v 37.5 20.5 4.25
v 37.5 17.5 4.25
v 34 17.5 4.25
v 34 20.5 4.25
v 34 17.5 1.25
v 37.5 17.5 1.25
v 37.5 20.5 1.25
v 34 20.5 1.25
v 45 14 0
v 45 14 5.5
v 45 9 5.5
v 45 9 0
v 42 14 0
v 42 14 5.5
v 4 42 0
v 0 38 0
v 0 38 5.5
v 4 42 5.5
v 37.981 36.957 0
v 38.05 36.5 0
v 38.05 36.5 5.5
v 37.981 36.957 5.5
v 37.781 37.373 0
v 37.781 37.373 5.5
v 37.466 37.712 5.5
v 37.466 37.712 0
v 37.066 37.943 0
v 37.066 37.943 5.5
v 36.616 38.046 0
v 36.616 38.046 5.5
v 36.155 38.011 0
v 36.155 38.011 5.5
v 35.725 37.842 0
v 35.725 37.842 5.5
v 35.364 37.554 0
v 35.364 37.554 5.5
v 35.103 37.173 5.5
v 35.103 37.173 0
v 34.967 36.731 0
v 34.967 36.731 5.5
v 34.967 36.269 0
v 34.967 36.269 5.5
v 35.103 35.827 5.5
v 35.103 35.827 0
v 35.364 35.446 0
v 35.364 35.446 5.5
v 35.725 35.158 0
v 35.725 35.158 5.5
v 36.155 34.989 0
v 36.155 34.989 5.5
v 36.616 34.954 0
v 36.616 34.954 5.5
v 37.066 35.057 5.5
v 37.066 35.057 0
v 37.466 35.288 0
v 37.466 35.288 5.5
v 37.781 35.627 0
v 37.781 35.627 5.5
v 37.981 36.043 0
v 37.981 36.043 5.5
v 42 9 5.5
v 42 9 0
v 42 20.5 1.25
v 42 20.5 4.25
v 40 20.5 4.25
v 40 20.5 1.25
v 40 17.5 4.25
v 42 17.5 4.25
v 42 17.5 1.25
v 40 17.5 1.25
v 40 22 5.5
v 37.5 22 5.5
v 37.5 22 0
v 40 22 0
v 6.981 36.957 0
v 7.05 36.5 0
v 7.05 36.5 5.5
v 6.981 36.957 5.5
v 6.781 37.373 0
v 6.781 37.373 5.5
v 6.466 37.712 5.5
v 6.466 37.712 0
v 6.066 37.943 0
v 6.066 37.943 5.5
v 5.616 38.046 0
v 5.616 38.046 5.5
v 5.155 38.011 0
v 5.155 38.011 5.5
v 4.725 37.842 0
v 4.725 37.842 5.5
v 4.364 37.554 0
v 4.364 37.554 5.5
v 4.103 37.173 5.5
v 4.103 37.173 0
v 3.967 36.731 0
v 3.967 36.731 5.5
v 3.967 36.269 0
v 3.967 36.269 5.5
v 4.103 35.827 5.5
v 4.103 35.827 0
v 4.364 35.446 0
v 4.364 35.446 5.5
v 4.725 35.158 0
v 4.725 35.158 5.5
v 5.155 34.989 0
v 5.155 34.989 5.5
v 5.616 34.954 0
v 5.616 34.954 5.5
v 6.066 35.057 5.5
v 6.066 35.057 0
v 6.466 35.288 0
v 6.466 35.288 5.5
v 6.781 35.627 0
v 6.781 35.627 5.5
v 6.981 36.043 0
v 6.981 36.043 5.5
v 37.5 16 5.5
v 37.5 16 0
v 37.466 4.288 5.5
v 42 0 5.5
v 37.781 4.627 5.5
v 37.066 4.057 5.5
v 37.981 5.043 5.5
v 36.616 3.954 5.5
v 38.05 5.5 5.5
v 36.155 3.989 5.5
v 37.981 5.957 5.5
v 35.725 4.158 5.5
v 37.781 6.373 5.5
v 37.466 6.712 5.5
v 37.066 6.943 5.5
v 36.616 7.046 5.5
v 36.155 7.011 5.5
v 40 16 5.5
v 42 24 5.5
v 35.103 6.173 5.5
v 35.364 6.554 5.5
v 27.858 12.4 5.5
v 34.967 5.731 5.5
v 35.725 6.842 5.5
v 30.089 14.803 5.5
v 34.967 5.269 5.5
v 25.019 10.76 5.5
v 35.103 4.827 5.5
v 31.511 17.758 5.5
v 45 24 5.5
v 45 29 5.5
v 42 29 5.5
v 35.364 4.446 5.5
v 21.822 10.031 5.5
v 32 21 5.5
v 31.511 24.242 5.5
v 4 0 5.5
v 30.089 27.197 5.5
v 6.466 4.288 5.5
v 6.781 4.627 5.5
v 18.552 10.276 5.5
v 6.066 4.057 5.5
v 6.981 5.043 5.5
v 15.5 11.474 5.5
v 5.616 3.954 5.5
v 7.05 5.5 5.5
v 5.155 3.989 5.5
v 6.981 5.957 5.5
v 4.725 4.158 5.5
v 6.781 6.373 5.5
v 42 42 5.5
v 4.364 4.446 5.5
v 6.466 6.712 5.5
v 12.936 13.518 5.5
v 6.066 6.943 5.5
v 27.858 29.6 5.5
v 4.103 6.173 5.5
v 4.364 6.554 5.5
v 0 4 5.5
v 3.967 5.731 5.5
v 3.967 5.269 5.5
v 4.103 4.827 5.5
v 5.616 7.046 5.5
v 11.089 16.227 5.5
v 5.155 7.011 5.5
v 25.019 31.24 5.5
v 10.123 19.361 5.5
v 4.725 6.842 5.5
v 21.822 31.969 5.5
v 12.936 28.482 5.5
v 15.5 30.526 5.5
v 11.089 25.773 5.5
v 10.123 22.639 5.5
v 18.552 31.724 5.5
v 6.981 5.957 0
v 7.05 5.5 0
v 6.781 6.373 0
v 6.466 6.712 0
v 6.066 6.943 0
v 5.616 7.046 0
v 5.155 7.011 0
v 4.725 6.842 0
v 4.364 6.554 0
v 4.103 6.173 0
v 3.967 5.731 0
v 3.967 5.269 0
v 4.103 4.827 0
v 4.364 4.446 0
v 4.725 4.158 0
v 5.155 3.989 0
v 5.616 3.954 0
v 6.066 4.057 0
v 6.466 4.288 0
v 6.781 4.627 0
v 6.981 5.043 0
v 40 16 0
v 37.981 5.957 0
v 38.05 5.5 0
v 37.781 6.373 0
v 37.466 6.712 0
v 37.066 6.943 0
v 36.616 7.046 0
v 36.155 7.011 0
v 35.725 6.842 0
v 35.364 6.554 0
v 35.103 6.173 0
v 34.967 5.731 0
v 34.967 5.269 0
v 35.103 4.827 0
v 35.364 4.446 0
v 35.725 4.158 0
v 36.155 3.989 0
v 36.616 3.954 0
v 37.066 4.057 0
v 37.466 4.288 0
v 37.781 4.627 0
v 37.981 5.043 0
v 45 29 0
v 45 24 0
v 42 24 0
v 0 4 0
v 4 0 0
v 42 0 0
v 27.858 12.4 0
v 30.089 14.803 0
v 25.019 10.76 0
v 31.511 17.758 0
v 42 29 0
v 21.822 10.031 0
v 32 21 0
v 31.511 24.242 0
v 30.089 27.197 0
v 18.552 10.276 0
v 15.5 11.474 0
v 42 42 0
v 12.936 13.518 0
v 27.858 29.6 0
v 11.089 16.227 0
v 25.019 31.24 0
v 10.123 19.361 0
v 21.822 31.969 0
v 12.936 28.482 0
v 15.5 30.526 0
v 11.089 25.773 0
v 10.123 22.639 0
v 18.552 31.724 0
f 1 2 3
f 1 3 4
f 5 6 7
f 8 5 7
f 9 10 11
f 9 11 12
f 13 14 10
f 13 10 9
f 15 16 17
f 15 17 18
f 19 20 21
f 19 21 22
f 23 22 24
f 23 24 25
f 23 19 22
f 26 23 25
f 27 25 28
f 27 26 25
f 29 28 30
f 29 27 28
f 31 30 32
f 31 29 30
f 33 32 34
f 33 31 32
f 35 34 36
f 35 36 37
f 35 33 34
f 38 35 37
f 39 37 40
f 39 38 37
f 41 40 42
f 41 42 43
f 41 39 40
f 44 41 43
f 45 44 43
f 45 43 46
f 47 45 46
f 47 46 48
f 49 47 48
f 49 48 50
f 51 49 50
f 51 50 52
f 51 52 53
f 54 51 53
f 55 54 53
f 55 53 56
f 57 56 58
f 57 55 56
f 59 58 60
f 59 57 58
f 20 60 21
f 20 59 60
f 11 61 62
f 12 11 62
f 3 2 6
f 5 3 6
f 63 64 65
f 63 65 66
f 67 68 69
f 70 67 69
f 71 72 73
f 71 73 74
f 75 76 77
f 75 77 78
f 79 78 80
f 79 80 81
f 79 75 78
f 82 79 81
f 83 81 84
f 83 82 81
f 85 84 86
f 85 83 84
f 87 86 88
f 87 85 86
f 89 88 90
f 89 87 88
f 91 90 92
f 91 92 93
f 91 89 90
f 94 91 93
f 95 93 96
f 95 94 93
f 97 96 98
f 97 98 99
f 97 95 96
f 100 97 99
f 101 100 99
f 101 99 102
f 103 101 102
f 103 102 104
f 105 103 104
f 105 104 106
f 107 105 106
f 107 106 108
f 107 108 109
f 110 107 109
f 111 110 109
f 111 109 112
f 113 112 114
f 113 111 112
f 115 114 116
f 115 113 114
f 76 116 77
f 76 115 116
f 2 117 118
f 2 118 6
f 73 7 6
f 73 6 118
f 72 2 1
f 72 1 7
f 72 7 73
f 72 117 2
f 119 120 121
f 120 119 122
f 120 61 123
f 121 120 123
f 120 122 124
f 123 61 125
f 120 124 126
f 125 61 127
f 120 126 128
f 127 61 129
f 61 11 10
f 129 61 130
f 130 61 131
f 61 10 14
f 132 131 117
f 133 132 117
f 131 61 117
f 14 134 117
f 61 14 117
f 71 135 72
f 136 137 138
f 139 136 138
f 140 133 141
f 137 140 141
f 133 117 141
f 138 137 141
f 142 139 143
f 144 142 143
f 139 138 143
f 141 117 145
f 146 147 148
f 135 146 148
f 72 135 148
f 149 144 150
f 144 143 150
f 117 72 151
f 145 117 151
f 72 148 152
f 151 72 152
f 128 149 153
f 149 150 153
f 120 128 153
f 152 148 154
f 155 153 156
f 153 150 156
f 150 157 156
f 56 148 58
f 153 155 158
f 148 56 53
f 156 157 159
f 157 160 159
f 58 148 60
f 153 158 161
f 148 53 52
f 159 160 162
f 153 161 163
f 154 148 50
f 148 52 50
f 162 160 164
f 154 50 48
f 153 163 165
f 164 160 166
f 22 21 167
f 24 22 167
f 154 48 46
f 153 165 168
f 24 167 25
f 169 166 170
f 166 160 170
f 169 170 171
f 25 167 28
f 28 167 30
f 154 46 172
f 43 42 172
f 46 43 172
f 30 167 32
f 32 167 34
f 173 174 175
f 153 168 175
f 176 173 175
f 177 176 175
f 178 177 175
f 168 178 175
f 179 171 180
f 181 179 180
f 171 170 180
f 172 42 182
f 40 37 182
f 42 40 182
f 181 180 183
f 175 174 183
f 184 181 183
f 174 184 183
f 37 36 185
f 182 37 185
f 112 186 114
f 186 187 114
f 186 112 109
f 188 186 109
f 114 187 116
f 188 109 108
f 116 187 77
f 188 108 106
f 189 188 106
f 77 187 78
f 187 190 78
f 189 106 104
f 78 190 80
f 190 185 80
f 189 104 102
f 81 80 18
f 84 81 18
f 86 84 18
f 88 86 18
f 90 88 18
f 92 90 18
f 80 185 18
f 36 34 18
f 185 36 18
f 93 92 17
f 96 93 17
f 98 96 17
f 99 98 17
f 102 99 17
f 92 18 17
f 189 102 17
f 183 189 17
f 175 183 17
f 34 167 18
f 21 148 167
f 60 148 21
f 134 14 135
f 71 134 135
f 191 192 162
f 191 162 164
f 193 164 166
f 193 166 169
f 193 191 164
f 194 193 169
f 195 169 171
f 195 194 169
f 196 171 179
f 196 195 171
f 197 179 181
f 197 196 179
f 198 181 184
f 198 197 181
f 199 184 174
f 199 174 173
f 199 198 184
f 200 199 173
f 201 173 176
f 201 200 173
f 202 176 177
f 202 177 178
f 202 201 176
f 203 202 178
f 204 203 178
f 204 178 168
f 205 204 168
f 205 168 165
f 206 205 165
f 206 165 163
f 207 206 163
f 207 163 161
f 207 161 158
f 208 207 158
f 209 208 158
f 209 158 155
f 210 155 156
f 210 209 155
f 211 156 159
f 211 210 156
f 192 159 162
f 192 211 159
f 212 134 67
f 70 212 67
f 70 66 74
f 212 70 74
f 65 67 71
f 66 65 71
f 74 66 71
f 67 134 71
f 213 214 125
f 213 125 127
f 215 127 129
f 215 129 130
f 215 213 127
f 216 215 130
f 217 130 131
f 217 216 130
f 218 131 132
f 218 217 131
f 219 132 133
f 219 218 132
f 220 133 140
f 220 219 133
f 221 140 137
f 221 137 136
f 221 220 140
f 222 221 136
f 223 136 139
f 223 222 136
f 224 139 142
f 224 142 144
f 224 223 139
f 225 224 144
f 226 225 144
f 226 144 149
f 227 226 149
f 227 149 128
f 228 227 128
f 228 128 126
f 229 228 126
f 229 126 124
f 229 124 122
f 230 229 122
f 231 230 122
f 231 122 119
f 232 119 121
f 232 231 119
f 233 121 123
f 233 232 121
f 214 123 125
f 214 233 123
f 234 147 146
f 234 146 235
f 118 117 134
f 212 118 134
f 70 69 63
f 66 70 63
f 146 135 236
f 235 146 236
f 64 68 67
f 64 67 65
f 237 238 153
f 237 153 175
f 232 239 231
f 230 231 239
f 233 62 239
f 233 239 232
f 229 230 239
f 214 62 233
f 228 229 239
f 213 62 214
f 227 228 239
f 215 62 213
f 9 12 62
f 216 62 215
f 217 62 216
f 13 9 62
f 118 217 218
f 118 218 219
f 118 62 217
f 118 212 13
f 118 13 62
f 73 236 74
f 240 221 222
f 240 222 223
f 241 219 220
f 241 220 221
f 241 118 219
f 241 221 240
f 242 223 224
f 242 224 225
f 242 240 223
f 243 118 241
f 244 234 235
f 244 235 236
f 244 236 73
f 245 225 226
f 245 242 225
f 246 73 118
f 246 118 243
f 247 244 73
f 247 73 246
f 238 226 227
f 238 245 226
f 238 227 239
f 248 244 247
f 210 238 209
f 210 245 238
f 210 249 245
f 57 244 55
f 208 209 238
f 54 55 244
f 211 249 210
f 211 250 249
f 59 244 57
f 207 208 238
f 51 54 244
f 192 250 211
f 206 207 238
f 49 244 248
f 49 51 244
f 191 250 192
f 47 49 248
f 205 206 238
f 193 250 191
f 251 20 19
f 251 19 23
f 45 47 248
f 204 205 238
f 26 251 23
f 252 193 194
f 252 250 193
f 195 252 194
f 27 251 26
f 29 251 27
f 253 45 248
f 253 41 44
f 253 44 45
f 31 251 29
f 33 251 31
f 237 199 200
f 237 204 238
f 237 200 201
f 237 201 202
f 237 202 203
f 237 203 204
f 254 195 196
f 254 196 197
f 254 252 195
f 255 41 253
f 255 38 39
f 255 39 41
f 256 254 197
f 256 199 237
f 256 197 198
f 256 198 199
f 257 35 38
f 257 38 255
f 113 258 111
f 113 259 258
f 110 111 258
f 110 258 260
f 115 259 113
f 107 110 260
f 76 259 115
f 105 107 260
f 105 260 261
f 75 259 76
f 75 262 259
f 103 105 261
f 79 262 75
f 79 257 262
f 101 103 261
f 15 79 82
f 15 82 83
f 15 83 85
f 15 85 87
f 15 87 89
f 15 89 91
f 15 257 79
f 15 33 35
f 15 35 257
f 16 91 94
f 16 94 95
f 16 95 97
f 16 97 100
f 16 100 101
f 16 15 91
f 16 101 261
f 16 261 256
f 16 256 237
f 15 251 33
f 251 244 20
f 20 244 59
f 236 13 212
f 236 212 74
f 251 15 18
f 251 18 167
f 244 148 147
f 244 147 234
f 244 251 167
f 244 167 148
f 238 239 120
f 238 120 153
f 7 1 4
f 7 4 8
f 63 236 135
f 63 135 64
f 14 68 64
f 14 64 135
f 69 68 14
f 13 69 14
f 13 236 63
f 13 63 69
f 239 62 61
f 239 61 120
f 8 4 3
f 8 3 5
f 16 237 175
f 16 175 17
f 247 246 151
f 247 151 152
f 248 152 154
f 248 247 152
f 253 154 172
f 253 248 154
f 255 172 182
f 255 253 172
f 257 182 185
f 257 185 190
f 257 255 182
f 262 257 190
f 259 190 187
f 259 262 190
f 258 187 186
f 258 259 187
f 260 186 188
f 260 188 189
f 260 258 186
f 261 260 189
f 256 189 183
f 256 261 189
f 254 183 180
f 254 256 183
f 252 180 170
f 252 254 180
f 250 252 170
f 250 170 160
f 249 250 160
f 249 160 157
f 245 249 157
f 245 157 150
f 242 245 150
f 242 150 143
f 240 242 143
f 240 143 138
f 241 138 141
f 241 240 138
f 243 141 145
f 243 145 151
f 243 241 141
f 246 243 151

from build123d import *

# Parameters (mm, degrees)
CROQUIS1_R              = 11
CROQUIS1_R_2            = 1.55
SALIENTE_EXTRUIR1_DEPTH = 5.5
CROQUIS3_W              = 5.5
CROQUIS3_H              = 5
SALIENTE_EXTRUIR3_DEPTH = 3
CROQUIS6_W              = 3
CROQUIS6_H              = 3
CORTAR_EXTRUIR2_DEPTH   = 8
CROQUIS7_W              = 2.5
CROQUIS7_H              = 6
CORTAR_EXTRUIR3_DEPTH   = 6.5


with BuildPart() as part:
    # Croquis1 → Saliente-Extruir1 (new body)
    with BuildSketch(Plane.XY):
        Polygon((4, 0), (0, 4), (0, 38), (4, 42), (42, 42), (42, 0), align=None)
        with Locations((21, 21)):
            Circle(CROQUIS1_R, mode=Mode.SUBTRACT)
        with Locations((36.5, 36.5)):
            Circle(CROQUIS1_R_2, mode=Mode.SUBTRACT)
        with Locations((36.5, 5.5)):
            Circle(CROQUIS1_R_2, mode=Mode.SUBTRACT)
        with Locations((5.5, 5.5)):
            Circle(CROQUIS1_R_2, mode=Mode.SUBTRACT)
        with Locations((5.5, 36.5)):
            Circle(CROQUIS1_R_2, mode=Mode.SUBTRACT)
    extrude(amount=SALIENTE_EXTRUIR1_DEPTH)

    # Croquis3 → Saliente-Extruir3 (add)
    with BuildSketch(Plane(origin=(42, 0, 0), x_dir=(0, 0, -1), z_dir=(1, 0, 0))):
        with Locations((-2.75, 26.5)):
            Rectangle(CROQUIS3_W, CROQUIS3_H)
        with Locations((-2.75, 11.5)):
            Rectangle(CROQUIS3_W, CROQUIS3_H)
    extrude(amount=SALIENTE_EXTRUIR3_DEPTH)

    # Croquis6 → Cortar-Extruir2 (cut)
    with BuildSketch(Plane(origin=(42, 0, 0), x_dir=(0, 0, -1), z_dir=(1, 0, 0))):
        with Locations((-2.75, 19)):
            Rectangle(CROQUIS6_W, CROQUIS6_H)
    extrude(amount=-CORTAR_EXTRUIR2_DEPTH, mode=Mode.SUBTRACT)

    # Croquis7 → Cortar-Extruir3 (cut, through all)
    with BuildSketch(Plane.XY.offset(5.5)):
        with Locations((38.75, 19)):
            Rectangle(CROQUIS7_W, CROQUIS7_H)
    extrude(amount=-CORTAR_EXTRUIR3_DEPTH, mode=Mode.SUBTRACT)


solid = part.part
